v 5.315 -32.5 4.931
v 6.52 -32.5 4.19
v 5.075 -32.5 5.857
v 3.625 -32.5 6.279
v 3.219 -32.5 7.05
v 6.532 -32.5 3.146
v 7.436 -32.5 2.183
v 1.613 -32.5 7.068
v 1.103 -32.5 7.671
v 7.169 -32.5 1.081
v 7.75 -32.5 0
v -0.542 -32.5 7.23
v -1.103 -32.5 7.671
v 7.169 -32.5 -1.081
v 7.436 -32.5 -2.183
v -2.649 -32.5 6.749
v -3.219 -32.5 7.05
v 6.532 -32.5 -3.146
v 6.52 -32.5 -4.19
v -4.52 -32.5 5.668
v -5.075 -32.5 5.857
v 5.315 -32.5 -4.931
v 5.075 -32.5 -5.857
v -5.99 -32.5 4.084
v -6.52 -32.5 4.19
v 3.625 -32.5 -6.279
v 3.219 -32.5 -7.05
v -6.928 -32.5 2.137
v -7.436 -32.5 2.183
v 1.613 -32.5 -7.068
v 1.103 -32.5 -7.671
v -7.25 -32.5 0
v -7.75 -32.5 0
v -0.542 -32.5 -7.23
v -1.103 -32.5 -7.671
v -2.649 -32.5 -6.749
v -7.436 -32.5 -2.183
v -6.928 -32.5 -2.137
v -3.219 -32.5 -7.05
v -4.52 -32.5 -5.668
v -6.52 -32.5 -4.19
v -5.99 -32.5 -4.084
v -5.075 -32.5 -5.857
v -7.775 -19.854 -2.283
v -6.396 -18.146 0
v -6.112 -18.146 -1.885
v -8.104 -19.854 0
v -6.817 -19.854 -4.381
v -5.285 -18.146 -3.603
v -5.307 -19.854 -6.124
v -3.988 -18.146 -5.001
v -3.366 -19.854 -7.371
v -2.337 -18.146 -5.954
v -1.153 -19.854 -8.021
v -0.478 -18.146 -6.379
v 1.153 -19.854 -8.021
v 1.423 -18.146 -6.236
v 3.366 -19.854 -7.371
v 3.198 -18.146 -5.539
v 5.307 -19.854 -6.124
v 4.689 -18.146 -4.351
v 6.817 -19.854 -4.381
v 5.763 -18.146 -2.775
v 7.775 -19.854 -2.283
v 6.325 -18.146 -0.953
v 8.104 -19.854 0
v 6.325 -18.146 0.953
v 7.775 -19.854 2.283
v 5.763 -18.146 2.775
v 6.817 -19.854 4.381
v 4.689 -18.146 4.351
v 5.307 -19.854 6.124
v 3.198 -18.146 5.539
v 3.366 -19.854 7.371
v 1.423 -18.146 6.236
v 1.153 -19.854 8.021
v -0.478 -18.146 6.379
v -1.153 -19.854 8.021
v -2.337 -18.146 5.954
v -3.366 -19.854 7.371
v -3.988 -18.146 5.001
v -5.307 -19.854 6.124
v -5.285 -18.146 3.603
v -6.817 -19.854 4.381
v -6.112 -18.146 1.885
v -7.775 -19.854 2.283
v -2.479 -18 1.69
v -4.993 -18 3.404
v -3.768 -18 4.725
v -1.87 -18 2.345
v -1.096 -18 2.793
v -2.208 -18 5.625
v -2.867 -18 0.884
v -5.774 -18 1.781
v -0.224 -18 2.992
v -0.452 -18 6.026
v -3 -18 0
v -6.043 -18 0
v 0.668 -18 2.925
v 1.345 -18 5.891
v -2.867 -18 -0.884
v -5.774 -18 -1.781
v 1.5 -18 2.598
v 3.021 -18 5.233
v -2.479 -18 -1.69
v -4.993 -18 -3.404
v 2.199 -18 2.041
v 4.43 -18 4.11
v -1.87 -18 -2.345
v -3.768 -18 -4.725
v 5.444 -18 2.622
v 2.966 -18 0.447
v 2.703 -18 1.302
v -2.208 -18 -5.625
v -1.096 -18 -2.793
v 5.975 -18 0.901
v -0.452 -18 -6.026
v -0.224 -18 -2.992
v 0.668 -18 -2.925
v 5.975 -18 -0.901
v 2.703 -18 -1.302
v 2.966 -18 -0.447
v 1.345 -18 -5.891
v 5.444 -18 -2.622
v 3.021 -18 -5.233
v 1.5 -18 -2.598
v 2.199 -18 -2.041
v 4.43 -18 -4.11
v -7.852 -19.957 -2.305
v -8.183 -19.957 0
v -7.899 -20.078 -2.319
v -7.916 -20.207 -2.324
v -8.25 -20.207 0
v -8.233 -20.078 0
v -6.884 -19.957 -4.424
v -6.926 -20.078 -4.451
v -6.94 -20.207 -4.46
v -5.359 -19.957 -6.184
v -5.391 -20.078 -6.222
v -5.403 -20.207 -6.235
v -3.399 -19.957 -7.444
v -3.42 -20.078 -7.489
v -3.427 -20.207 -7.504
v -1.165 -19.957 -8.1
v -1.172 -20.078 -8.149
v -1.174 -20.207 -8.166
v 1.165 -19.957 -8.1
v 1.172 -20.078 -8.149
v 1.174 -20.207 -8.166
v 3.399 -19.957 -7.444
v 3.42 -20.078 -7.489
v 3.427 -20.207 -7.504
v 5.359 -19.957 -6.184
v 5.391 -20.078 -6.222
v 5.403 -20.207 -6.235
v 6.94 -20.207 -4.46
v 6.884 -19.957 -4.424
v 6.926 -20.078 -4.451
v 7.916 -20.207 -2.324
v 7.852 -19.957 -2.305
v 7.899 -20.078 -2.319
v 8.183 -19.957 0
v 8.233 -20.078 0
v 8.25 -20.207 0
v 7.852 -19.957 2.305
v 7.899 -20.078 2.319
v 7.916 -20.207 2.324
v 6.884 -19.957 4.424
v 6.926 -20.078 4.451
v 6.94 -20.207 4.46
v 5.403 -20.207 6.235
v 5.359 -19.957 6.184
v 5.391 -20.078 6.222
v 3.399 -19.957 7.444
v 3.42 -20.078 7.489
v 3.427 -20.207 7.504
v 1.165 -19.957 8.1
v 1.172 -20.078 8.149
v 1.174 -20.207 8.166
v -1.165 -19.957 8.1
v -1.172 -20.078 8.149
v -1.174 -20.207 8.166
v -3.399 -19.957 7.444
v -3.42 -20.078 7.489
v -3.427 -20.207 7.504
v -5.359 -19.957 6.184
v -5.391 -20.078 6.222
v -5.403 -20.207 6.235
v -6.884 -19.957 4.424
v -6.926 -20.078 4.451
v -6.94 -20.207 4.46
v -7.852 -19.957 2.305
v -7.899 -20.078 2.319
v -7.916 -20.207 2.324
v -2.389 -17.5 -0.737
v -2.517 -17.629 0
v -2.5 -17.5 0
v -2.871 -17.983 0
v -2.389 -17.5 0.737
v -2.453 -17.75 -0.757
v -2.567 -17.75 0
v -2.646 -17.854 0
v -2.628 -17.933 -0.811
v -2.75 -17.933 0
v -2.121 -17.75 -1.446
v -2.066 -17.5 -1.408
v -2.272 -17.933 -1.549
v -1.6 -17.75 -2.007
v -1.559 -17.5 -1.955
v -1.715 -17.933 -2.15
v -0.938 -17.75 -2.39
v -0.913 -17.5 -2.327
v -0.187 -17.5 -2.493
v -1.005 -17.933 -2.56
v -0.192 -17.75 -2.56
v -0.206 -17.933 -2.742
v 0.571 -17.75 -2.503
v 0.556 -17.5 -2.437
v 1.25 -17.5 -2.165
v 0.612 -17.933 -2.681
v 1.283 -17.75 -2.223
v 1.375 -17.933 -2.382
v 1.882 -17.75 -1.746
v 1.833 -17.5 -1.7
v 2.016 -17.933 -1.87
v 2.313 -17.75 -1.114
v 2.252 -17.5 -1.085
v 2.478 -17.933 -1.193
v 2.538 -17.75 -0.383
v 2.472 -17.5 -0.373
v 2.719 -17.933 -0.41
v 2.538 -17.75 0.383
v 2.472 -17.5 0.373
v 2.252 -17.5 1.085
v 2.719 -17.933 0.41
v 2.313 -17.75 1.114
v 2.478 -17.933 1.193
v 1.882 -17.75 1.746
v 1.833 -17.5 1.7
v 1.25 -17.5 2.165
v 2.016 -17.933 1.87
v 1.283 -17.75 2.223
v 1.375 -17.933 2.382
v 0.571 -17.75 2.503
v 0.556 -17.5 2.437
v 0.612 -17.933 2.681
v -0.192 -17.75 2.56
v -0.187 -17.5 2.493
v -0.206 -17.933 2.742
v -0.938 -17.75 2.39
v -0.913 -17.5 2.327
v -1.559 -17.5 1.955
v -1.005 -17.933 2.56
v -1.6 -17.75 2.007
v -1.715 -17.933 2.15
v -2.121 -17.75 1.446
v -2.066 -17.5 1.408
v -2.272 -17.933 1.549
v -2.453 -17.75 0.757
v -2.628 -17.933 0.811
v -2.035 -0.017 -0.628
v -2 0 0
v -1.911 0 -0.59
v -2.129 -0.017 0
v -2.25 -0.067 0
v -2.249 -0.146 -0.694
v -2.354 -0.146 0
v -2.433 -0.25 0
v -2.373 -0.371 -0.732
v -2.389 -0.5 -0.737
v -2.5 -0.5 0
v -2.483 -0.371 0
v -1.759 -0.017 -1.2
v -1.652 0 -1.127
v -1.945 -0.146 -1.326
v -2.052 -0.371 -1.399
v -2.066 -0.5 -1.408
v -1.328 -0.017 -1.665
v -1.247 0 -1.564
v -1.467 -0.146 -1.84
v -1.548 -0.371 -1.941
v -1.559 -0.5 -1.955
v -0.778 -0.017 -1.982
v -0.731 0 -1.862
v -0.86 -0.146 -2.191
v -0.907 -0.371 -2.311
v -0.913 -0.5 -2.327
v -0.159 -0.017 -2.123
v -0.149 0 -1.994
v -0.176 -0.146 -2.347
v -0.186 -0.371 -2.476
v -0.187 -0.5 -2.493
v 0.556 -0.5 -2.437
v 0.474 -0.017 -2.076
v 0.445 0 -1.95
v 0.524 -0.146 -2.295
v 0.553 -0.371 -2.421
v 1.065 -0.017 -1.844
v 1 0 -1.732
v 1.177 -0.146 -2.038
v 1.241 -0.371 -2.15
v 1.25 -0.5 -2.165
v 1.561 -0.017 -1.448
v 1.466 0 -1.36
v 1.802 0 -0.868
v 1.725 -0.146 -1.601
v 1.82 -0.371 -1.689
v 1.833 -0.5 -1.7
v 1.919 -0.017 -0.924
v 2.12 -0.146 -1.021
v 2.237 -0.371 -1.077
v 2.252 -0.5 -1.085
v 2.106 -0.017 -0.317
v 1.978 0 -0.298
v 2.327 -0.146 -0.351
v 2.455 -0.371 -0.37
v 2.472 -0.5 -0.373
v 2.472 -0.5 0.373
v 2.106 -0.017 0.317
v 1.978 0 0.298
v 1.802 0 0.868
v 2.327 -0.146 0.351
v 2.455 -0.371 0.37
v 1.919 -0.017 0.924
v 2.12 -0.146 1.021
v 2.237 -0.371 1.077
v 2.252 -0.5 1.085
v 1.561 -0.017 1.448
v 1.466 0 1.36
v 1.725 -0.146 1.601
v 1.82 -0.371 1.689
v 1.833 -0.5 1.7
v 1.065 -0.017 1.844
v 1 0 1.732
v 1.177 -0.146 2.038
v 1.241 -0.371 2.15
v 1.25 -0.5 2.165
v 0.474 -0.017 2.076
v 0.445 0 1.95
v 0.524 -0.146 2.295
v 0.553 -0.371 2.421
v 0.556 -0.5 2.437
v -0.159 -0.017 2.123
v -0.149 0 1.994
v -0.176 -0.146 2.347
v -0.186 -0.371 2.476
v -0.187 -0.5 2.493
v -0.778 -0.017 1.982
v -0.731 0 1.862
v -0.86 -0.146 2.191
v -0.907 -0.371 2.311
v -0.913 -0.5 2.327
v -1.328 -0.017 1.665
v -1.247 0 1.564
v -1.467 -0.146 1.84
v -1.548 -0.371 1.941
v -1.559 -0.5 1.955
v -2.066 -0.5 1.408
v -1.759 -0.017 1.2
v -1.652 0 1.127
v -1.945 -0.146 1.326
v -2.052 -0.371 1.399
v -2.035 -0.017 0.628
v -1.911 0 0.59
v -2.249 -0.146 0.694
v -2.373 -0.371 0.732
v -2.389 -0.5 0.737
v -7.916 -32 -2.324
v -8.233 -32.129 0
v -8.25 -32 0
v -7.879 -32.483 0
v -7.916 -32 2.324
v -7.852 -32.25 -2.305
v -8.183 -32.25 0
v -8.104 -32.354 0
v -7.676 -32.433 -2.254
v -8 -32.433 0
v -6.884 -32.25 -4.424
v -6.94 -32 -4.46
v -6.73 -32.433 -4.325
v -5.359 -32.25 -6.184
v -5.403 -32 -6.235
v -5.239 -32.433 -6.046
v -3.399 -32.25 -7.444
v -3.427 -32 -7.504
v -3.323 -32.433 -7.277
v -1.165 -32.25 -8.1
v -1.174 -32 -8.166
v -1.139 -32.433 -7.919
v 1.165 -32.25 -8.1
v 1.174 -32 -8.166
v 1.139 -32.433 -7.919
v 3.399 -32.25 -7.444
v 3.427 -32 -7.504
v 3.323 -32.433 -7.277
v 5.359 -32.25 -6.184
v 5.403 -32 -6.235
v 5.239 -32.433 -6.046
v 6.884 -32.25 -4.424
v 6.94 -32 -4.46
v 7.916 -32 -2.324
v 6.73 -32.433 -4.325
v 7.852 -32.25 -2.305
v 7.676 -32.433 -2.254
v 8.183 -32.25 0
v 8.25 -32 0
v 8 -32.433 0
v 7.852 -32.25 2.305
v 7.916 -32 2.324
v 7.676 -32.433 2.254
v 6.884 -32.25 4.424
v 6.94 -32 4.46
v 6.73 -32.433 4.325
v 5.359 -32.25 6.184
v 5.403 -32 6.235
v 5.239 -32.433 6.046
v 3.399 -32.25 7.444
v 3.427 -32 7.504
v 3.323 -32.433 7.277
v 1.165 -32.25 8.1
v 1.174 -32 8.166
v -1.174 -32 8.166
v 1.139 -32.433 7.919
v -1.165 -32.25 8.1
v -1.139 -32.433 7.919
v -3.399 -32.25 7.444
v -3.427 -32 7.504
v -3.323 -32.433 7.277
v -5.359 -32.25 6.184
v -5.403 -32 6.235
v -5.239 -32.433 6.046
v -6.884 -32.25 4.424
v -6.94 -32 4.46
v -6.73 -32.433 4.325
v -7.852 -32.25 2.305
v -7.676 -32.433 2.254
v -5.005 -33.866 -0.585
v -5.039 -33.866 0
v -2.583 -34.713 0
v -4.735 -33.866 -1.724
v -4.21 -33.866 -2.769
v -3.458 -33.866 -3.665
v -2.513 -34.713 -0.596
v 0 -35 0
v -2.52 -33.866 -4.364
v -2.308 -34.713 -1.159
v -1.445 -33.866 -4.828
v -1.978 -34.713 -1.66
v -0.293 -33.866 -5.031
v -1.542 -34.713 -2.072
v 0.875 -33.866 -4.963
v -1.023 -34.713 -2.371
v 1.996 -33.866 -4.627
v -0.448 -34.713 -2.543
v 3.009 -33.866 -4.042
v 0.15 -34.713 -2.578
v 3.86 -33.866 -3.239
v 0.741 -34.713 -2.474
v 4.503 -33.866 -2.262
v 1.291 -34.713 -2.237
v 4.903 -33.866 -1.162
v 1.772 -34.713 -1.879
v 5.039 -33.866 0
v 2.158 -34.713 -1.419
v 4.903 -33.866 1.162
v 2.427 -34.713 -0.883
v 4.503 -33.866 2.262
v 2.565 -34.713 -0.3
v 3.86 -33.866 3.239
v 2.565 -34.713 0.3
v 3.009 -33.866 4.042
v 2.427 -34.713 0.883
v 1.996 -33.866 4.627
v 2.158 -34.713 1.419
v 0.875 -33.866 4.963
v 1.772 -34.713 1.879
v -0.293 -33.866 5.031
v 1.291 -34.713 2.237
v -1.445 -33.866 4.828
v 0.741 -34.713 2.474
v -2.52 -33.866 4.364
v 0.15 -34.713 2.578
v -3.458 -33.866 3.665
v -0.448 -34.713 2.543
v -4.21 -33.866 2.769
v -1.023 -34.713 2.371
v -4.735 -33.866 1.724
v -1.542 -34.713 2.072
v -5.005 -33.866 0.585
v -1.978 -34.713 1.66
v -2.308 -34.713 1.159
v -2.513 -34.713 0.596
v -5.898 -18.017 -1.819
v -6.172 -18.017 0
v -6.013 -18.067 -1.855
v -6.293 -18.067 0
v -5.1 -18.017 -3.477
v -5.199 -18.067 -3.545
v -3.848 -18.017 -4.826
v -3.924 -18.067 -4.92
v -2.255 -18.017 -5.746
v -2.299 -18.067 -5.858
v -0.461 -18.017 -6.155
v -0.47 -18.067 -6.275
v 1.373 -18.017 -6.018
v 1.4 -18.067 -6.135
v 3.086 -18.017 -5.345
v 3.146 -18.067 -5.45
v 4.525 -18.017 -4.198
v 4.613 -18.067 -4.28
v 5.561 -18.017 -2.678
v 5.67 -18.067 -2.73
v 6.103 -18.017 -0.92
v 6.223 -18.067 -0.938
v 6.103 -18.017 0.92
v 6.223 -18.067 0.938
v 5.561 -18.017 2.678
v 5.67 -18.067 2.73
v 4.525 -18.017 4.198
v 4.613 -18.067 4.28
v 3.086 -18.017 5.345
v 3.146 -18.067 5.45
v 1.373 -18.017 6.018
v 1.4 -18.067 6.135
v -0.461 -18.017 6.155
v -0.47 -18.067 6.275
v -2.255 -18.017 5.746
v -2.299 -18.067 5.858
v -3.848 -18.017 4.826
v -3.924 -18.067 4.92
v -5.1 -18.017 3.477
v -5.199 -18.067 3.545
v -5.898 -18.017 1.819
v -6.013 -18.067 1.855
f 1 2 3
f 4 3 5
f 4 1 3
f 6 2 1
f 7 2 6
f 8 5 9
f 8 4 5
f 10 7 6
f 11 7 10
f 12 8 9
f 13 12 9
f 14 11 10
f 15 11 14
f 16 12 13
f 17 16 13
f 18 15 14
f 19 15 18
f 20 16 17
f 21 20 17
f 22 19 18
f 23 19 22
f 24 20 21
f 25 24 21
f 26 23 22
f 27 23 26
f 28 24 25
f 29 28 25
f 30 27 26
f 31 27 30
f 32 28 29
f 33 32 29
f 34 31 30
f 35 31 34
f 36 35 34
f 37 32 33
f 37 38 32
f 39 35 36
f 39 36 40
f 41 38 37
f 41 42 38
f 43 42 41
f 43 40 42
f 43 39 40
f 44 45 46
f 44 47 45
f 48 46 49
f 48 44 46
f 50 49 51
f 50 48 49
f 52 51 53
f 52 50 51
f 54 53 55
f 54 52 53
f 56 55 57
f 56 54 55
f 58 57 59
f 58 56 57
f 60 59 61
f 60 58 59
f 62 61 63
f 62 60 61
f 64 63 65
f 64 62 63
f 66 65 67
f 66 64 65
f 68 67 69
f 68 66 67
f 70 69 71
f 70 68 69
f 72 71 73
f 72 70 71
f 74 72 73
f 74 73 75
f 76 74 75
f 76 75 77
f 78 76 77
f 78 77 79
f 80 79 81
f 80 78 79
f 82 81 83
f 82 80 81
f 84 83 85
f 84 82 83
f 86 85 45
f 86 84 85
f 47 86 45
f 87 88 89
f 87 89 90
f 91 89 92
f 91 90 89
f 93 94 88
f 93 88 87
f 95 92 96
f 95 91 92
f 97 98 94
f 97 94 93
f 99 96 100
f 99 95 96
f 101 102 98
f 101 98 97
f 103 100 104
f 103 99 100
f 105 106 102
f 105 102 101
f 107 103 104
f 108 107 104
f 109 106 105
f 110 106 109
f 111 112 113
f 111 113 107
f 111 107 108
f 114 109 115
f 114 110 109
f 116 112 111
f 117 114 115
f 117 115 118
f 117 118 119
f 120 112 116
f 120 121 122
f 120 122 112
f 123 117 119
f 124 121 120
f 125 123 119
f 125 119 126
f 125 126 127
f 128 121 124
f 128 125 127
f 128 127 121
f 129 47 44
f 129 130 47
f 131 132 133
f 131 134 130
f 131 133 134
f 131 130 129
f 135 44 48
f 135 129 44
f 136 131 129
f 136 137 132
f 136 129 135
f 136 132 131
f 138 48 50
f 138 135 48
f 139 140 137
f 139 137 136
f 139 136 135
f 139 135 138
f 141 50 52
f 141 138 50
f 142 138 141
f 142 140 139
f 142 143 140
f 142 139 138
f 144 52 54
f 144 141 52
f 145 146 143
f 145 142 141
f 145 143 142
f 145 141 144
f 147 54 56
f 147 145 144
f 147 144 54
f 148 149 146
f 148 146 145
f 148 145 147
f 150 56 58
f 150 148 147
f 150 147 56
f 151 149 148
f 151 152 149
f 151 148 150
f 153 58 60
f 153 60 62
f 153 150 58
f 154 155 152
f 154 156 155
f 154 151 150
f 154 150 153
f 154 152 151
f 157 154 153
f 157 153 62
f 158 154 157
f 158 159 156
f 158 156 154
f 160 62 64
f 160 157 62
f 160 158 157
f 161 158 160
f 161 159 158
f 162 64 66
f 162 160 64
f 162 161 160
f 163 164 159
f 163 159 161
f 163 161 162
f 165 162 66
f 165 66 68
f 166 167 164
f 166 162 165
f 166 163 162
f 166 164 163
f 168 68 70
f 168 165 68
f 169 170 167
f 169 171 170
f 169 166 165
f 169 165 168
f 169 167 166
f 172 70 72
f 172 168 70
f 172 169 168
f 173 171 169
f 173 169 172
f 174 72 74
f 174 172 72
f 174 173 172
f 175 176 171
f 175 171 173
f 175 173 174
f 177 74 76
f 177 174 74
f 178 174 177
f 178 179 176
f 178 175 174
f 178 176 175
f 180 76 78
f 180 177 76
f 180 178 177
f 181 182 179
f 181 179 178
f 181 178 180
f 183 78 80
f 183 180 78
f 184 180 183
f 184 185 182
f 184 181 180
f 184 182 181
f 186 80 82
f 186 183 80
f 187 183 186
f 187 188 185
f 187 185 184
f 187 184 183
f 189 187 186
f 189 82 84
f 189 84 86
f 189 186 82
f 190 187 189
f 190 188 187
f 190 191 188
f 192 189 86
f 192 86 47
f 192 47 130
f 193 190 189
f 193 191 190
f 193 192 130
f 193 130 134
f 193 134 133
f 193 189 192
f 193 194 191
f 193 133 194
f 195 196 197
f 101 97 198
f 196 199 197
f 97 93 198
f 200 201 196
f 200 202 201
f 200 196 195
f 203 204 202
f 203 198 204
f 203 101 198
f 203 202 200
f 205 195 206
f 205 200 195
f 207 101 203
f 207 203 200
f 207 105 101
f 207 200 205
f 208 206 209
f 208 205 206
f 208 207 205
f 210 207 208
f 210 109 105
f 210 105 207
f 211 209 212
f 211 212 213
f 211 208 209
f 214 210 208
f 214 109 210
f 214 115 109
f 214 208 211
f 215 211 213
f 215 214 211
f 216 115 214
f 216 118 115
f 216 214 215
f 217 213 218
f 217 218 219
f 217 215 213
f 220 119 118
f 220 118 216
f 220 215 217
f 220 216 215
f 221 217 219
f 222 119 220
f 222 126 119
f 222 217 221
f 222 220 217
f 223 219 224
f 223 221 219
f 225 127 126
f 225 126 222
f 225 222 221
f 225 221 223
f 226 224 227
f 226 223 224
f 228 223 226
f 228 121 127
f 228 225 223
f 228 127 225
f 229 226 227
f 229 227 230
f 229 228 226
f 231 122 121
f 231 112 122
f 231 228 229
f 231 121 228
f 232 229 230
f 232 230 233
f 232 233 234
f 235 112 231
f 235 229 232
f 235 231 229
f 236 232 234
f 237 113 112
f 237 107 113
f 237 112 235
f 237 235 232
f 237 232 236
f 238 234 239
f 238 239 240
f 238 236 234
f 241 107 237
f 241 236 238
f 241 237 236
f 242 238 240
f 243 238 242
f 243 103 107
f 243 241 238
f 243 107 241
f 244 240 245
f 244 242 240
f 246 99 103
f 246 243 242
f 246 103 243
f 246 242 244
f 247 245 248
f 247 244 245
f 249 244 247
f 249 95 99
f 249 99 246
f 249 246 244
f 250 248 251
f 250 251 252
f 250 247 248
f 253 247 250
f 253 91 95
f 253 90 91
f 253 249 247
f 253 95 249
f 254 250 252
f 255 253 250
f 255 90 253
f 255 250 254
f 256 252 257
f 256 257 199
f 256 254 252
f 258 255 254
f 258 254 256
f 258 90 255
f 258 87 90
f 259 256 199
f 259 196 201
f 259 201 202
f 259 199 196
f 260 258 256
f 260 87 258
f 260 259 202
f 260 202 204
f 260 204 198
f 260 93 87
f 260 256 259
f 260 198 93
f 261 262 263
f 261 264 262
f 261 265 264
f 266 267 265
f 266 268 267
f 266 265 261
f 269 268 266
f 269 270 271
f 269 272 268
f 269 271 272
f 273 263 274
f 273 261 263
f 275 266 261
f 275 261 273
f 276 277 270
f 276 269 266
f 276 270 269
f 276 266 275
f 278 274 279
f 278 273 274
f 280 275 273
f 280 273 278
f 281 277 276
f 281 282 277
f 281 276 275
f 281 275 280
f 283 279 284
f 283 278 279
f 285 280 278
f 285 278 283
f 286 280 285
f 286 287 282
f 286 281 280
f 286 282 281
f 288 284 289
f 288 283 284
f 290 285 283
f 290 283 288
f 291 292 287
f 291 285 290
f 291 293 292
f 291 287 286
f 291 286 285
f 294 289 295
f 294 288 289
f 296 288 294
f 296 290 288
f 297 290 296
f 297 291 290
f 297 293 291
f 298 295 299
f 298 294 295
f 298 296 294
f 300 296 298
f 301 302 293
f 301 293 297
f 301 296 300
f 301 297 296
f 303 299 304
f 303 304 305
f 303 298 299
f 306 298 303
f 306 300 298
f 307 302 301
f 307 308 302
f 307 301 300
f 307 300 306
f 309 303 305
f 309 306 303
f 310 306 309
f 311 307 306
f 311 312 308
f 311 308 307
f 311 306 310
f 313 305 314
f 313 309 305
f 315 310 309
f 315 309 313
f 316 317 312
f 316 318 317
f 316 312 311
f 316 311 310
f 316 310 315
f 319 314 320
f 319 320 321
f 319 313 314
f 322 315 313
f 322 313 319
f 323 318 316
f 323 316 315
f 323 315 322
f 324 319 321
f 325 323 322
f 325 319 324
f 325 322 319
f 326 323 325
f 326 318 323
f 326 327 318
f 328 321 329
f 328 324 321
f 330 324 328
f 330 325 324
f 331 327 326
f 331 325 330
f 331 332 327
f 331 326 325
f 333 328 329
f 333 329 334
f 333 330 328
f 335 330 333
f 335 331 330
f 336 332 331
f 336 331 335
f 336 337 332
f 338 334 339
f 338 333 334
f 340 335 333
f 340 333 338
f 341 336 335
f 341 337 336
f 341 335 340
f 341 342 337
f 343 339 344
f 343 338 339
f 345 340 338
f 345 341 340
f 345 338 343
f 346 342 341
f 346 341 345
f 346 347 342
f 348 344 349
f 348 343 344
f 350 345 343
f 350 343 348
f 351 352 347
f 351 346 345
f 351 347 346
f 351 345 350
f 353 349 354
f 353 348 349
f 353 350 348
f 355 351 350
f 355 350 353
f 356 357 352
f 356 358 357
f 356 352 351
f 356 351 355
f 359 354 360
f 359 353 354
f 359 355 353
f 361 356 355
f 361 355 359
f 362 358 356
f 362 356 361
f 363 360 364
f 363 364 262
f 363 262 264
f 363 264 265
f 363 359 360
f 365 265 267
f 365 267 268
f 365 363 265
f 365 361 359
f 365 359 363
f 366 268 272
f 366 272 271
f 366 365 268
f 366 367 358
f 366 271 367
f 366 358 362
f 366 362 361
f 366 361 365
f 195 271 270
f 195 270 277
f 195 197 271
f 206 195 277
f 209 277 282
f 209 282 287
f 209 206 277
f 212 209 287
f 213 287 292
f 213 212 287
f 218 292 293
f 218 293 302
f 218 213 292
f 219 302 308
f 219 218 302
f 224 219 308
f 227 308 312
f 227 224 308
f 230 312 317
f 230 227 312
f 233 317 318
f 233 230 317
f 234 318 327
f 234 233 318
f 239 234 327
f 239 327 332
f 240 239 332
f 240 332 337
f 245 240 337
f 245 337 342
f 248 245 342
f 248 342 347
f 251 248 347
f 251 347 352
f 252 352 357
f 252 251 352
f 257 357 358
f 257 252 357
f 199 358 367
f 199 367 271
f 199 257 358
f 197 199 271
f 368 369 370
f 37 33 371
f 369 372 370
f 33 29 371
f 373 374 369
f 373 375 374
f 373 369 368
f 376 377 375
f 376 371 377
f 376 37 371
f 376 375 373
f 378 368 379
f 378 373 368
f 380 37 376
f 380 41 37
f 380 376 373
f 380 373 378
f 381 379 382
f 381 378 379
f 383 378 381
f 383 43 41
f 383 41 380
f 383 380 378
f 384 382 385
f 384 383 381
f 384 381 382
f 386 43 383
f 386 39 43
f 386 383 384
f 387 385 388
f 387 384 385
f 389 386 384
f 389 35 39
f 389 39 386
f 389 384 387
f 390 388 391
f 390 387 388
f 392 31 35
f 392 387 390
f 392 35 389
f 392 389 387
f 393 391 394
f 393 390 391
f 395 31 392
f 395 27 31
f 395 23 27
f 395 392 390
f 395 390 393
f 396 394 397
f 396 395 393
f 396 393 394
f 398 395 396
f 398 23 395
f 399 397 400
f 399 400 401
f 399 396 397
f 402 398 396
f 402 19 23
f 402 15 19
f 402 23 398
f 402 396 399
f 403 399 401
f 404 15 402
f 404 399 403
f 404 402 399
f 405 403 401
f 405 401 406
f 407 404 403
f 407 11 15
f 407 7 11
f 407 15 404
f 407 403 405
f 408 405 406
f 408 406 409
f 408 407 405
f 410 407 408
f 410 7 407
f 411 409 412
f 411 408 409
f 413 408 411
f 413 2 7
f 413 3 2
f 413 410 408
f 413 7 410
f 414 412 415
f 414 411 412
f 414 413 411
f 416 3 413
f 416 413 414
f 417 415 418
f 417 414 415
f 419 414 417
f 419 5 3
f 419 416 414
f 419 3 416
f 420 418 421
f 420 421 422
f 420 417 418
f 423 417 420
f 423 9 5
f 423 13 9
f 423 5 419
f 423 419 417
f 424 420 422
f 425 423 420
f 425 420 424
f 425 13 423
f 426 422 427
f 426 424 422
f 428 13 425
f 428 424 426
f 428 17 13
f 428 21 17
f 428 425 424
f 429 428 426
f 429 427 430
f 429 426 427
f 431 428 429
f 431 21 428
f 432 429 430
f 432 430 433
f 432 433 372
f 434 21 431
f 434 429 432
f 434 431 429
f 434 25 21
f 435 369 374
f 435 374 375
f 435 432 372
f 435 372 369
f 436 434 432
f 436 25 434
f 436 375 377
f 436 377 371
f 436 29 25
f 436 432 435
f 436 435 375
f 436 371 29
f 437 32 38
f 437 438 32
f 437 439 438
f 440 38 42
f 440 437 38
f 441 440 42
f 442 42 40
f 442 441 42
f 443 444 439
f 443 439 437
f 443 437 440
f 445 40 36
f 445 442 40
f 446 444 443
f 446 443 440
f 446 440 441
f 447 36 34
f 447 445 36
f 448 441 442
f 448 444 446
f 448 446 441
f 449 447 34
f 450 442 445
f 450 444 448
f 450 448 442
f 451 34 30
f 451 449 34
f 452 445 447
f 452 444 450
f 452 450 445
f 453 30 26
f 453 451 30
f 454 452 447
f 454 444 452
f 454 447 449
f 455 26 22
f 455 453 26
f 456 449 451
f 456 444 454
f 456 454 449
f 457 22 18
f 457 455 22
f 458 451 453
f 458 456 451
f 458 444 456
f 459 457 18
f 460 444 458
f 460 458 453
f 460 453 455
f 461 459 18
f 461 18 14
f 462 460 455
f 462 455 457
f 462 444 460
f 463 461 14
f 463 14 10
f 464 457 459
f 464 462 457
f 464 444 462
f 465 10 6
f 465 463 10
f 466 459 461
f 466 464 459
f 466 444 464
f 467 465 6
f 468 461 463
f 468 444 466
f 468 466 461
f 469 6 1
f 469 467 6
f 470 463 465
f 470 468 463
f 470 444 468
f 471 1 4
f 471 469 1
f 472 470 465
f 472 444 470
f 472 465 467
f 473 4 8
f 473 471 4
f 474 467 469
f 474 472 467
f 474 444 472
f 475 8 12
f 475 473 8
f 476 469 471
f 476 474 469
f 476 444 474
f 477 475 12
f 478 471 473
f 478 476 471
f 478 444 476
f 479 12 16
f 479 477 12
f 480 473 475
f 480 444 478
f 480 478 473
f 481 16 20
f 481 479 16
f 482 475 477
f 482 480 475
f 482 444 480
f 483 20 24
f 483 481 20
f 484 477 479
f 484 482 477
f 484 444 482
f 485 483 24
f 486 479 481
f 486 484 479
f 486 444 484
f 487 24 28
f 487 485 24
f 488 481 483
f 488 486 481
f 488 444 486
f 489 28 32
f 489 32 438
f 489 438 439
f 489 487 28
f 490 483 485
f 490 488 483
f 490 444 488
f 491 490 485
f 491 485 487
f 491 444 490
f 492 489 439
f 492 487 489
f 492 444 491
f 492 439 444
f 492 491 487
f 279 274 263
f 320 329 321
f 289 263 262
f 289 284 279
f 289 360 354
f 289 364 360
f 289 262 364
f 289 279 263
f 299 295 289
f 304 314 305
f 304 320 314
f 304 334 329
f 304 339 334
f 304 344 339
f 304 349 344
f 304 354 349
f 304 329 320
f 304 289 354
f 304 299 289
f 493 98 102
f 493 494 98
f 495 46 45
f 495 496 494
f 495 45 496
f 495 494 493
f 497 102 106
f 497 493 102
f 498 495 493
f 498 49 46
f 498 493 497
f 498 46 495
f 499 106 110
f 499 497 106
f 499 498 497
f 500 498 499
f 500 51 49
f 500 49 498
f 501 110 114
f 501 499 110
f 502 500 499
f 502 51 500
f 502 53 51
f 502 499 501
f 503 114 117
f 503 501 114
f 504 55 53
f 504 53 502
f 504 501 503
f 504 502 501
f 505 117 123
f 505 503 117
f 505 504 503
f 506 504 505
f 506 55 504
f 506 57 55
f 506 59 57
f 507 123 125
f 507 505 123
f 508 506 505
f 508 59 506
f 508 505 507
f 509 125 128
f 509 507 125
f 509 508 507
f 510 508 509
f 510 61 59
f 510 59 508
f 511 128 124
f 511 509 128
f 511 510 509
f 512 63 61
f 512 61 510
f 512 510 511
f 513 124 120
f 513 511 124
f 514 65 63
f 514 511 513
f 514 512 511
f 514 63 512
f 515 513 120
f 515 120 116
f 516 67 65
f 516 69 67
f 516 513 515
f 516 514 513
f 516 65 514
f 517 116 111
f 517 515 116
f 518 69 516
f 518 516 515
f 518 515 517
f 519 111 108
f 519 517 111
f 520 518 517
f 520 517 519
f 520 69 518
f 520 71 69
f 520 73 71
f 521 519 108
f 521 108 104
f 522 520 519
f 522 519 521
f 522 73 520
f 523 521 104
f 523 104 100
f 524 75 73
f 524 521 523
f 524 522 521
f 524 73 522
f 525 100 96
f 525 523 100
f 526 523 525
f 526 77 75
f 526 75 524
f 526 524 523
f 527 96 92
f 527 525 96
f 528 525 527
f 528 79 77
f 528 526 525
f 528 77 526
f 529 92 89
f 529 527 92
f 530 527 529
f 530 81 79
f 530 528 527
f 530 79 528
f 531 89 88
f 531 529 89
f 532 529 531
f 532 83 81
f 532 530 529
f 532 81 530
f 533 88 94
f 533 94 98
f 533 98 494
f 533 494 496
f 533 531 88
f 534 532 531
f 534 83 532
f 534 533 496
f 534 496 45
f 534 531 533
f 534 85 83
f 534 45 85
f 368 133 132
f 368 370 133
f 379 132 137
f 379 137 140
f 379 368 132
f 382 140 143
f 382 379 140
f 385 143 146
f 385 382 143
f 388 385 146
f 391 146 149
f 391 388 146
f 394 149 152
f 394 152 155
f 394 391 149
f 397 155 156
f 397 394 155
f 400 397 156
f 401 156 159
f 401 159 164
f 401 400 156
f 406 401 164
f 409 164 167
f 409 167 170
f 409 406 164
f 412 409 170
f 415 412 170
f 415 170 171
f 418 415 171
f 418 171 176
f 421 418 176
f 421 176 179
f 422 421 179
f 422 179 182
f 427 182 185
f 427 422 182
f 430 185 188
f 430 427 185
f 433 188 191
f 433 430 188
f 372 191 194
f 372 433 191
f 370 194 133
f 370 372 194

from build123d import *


with BuildPart() as part:
    # Sketch1 → Revolve1 (revolve)
    with BuildSketch(Plane.XY, mode=Mode.PRIVATE) as revolve1_sk:
        with BuildLine():
            ThreePointArc((8.25, -32), (8.103553391, -32.353553391), (7.75, -32.5))
            Line((7.75, -32.5), (7.25, -32.5))
            ThreePointArc((7.25, -32.5), (3.834465413, -34.357449696), (0, -35))
            Line((0, -35), (0, 0))
            Line((0, 0), (2, 0))
            ThreePointArc((2, 0), (2.353553391, -0.146446609), (2.5, -0.5))
            Line((2.5, -0.5), (2.5, -17.5))
            ThreePointArc((2.5, -17.5), (2.646446609, -17.853553391), (3, -18))
            Line((3, -18), (6.042893219, -18))
            ThreePointArc((6.042893219, -18), (6.234234935, -18.038060234), (6.396446609, -18.146446609))
            Line((6.396446609, -18.146446609), (8.103553391, -19.853553391))
            ThreePointArc((8.103553391, -19.853553391), (8.211939766, -20.015765065), (8.25, -20.207106781))
            Line((8.25, -20.207106781), (8.25, -32))
        make_face()
    revolve(revolve1_sk.sketch.rotate(Axis((0, 0, 0), (0, -1, 0)), 180), axis=Axis((0, 0, 0), (0, -1, 0)))


solid = part.part
